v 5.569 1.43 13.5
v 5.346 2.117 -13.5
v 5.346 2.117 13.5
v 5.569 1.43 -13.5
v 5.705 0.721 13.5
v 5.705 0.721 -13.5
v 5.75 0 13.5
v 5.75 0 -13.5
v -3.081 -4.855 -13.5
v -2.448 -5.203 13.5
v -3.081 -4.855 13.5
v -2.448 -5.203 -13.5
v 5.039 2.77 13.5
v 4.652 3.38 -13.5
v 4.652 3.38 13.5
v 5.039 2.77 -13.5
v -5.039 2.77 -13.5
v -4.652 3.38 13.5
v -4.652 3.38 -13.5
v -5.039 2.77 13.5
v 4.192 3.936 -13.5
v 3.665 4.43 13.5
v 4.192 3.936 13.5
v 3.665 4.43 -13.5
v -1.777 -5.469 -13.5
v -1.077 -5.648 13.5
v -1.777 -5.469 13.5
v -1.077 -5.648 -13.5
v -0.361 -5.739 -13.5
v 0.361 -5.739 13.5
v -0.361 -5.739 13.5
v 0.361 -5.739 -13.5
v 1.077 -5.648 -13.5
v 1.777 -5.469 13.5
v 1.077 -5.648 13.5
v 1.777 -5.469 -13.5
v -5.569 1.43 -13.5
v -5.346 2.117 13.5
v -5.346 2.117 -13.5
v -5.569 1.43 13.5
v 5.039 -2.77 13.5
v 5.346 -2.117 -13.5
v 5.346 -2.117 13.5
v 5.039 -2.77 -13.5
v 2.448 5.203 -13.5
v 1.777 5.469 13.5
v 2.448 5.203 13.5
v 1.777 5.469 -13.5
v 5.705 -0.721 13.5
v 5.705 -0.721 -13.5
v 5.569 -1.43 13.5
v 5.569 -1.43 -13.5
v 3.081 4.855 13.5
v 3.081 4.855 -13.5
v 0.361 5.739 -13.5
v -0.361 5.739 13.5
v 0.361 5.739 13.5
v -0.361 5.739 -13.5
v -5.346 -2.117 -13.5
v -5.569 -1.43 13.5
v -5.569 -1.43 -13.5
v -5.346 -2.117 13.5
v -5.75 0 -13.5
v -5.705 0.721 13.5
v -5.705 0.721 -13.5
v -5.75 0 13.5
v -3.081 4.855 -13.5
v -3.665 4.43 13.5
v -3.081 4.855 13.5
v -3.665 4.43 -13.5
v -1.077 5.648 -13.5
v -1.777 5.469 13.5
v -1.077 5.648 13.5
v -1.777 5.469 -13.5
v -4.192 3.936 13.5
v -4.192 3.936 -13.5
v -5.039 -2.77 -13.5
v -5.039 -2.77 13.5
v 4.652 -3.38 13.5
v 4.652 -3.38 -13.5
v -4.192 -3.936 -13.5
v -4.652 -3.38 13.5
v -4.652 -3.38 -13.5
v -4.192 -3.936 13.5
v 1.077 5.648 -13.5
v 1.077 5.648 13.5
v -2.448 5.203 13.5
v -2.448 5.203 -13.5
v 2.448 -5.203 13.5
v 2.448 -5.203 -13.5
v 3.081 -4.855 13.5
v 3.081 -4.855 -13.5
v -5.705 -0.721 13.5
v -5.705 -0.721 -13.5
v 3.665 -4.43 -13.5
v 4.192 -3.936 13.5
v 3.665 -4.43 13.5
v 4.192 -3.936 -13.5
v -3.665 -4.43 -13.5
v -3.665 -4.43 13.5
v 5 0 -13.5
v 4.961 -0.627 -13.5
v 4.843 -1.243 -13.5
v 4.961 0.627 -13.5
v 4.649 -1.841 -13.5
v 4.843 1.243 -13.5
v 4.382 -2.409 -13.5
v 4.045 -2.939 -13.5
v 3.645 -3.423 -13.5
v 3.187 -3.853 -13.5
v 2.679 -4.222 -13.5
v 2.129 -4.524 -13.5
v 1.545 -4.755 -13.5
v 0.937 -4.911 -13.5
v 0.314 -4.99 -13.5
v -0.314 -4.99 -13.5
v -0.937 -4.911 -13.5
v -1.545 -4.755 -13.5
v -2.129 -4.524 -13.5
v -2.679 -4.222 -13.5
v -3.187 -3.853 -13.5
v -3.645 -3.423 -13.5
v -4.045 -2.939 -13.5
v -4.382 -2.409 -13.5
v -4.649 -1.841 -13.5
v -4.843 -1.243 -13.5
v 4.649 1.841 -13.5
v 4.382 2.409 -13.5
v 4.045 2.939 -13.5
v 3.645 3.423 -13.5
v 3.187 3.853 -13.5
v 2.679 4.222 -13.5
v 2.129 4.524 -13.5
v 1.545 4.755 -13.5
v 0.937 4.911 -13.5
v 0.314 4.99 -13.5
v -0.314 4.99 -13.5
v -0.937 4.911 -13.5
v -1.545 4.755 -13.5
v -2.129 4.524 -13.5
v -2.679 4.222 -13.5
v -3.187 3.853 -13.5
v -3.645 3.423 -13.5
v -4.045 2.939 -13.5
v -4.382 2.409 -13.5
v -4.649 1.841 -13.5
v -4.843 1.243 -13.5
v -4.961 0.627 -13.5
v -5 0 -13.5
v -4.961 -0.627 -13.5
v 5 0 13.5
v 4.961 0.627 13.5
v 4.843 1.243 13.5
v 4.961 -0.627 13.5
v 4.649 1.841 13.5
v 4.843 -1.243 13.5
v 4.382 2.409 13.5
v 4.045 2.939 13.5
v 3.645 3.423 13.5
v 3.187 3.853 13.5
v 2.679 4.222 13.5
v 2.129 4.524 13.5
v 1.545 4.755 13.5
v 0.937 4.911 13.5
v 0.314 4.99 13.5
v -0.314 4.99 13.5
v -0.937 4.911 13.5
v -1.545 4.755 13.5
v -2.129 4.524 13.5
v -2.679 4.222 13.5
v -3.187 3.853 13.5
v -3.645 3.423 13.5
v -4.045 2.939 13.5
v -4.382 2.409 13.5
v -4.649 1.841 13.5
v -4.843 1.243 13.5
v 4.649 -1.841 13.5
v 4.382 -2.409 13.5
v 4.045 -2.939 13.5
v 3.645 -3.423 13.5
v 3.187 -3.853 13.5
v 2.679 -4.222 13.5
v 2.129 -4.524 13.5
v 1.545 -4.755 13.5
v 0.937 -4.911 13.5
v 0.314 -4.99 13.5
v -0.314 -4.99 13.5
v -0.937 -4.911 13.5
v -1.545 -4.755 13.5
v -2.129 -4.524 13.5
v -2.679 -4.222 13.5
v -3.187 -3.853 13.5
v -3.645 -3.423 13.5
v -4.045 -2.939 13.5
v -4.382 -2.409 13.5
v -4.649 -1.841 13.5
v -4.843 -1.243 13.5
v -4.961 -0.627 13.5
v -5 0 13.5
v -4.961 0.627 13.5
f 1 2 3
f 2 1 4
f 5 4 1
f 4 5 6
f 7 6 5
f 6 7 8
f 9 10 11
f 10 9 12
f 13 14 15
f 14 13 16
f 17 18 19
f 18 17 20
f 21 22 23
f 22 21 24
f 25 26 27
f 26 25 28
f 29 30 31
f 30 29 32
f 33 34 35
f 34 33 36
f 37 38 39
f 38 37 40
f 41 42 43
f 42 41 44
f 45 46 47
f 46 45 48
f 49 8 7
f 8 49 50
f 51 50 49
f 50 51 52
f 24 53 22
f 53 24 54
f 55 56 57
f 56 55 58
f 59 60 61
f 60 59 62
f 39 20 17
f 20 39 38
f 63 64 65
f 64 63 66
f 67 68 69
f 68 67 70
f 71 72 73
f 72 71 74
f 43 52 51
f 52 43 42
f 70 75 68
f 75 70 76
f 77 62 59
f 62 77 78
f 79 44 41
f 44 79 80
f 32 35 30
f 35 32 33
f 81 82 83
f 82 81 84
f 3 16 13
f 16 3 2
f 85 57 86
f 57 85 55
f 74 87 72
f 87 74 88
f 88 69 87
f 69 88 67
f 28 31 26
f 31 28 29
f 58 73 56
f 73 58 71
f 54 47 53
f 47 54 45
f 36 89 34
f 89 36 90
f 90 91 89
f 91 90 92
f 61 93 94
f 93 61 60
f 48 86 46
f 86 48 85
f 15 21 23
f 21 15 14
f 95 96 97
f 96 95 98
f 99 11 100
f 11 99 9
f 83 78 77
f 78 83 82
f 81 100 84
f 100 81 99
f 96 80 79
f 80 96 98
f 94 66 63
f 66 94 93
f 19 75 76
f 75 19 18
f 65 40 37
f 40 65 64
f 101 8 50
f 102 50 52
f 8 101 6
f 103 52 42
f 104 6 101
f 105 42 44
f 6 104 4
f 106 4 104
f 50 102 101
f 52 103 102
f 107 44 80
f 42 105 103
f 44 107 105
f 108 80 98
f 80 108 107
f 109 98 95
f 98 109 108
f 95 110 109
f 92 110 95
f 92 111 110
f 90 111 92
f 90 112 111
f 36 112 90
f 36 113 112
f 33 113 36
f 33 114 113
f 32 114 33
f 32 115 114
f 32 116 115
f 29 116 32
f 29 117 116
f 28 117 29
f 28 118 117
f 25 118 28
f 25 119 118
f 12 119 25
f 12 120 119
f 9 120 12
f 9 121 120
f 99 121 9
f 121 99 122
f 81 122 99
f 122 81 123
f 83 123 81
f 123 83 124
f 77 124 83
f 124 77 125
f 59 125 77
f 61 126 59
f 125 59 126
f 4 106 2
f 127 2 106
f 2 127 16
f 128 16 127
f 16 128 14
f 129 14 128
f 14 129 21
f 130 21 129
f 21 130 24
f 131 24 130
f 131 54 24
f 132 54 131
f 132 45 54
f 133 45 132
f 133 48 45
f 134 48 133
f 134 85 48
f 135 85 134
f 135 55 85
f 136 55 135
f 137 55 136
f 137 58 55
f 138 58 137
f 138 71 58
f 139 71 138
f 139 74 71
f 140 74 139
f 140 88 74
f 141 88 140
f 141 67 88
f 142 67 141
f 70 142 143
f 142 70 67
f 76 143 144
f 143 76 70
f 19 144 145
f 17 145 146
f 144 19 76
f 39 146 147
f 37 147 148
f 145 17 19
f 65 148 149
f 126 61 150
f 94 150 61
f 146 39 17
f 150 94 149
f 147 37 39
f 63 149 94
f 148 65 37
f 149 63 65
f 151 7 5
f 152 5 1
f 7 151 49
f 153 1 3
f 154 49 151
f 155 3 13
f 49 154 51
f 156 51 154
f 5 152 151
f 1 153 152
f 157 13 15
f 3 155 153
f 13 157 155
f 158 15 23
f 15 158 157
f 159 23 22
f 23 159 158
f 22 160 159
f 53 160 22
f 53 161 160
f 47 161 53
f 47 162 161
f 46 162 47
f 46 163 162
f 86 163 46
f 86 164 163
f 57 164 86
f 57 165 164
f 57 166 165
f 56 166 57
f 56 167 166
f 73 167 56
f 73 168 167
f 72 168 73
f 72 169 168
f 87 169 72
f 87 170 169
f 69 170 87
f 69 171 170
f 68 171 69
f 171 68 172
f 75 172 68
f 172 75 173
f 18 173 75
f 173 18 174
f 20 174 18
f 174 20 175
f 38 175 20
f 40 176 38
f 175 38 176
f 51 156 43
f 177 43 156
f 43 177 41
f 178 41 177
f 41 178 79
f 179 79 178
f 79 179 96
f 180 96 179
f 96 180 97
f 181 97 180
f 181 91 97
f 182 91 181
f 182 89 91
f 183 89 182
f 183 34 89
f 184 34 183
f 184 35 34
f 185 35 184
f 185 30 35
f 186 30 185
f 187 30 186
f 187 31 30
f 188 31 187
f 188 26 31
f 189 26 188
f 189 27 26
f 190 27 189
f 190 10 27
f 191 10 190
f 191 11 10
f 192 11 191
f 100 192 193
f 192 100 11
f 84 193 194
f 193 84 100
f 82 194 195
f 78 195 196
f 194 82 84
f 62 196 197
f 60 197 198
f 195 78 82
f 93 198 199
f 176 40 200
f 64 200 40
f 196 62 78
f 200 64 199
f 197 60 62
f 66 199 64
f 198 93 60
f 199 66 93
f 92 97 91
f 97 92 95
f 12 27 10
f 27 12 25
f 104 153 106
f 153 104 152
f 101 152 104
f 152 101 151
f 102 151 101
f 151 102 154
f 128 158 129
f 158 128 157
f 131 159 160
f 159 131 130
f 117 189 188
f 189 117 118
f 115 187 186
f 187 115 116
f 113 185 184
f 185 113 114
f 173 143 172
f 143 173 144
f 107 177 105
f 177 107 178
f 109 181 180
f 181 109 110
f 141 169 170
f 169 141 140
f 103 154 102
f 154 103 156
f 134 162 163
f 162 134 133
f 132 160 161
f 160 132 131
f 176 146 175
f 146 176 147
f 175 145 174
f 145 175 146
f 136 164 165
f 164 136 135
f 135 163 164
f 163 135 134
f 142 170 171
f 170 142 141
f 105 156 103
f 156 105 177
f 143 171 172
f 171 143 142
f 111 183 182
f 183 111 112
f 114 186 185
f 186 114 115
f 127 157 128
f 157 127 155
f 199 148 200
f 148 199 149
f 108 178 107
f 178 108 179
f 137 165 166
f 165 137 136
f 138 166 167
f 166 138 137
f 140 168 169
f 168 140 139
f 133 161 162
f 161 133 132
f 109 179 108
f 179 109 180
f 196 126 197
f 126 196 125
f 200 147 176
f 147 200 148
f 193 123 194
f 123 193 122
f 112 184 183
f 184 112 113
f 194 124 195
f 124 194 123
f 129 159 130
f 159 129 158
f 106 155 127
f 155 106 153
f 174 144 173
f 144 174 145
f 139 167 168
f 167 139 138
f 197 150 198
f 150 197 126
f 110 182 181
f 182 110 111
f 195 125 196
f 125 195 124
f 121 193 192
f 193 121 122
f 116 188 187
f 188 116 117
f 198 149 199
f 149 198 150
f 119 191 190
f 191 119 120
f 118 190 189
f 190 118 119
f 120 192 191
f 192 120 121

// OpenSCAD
$fn = 50;


difference() {
	union() {
		translate(v = [0, 0, -13.5000000000]) {
			cylinder(h = 27, r = 5.7500000000);
		}
	}
	union() {
		translate(v = [0, 0, -100.0000000000]) {
			cylinder(h = 200, r = 5.0000000000);
		}
	}
}
